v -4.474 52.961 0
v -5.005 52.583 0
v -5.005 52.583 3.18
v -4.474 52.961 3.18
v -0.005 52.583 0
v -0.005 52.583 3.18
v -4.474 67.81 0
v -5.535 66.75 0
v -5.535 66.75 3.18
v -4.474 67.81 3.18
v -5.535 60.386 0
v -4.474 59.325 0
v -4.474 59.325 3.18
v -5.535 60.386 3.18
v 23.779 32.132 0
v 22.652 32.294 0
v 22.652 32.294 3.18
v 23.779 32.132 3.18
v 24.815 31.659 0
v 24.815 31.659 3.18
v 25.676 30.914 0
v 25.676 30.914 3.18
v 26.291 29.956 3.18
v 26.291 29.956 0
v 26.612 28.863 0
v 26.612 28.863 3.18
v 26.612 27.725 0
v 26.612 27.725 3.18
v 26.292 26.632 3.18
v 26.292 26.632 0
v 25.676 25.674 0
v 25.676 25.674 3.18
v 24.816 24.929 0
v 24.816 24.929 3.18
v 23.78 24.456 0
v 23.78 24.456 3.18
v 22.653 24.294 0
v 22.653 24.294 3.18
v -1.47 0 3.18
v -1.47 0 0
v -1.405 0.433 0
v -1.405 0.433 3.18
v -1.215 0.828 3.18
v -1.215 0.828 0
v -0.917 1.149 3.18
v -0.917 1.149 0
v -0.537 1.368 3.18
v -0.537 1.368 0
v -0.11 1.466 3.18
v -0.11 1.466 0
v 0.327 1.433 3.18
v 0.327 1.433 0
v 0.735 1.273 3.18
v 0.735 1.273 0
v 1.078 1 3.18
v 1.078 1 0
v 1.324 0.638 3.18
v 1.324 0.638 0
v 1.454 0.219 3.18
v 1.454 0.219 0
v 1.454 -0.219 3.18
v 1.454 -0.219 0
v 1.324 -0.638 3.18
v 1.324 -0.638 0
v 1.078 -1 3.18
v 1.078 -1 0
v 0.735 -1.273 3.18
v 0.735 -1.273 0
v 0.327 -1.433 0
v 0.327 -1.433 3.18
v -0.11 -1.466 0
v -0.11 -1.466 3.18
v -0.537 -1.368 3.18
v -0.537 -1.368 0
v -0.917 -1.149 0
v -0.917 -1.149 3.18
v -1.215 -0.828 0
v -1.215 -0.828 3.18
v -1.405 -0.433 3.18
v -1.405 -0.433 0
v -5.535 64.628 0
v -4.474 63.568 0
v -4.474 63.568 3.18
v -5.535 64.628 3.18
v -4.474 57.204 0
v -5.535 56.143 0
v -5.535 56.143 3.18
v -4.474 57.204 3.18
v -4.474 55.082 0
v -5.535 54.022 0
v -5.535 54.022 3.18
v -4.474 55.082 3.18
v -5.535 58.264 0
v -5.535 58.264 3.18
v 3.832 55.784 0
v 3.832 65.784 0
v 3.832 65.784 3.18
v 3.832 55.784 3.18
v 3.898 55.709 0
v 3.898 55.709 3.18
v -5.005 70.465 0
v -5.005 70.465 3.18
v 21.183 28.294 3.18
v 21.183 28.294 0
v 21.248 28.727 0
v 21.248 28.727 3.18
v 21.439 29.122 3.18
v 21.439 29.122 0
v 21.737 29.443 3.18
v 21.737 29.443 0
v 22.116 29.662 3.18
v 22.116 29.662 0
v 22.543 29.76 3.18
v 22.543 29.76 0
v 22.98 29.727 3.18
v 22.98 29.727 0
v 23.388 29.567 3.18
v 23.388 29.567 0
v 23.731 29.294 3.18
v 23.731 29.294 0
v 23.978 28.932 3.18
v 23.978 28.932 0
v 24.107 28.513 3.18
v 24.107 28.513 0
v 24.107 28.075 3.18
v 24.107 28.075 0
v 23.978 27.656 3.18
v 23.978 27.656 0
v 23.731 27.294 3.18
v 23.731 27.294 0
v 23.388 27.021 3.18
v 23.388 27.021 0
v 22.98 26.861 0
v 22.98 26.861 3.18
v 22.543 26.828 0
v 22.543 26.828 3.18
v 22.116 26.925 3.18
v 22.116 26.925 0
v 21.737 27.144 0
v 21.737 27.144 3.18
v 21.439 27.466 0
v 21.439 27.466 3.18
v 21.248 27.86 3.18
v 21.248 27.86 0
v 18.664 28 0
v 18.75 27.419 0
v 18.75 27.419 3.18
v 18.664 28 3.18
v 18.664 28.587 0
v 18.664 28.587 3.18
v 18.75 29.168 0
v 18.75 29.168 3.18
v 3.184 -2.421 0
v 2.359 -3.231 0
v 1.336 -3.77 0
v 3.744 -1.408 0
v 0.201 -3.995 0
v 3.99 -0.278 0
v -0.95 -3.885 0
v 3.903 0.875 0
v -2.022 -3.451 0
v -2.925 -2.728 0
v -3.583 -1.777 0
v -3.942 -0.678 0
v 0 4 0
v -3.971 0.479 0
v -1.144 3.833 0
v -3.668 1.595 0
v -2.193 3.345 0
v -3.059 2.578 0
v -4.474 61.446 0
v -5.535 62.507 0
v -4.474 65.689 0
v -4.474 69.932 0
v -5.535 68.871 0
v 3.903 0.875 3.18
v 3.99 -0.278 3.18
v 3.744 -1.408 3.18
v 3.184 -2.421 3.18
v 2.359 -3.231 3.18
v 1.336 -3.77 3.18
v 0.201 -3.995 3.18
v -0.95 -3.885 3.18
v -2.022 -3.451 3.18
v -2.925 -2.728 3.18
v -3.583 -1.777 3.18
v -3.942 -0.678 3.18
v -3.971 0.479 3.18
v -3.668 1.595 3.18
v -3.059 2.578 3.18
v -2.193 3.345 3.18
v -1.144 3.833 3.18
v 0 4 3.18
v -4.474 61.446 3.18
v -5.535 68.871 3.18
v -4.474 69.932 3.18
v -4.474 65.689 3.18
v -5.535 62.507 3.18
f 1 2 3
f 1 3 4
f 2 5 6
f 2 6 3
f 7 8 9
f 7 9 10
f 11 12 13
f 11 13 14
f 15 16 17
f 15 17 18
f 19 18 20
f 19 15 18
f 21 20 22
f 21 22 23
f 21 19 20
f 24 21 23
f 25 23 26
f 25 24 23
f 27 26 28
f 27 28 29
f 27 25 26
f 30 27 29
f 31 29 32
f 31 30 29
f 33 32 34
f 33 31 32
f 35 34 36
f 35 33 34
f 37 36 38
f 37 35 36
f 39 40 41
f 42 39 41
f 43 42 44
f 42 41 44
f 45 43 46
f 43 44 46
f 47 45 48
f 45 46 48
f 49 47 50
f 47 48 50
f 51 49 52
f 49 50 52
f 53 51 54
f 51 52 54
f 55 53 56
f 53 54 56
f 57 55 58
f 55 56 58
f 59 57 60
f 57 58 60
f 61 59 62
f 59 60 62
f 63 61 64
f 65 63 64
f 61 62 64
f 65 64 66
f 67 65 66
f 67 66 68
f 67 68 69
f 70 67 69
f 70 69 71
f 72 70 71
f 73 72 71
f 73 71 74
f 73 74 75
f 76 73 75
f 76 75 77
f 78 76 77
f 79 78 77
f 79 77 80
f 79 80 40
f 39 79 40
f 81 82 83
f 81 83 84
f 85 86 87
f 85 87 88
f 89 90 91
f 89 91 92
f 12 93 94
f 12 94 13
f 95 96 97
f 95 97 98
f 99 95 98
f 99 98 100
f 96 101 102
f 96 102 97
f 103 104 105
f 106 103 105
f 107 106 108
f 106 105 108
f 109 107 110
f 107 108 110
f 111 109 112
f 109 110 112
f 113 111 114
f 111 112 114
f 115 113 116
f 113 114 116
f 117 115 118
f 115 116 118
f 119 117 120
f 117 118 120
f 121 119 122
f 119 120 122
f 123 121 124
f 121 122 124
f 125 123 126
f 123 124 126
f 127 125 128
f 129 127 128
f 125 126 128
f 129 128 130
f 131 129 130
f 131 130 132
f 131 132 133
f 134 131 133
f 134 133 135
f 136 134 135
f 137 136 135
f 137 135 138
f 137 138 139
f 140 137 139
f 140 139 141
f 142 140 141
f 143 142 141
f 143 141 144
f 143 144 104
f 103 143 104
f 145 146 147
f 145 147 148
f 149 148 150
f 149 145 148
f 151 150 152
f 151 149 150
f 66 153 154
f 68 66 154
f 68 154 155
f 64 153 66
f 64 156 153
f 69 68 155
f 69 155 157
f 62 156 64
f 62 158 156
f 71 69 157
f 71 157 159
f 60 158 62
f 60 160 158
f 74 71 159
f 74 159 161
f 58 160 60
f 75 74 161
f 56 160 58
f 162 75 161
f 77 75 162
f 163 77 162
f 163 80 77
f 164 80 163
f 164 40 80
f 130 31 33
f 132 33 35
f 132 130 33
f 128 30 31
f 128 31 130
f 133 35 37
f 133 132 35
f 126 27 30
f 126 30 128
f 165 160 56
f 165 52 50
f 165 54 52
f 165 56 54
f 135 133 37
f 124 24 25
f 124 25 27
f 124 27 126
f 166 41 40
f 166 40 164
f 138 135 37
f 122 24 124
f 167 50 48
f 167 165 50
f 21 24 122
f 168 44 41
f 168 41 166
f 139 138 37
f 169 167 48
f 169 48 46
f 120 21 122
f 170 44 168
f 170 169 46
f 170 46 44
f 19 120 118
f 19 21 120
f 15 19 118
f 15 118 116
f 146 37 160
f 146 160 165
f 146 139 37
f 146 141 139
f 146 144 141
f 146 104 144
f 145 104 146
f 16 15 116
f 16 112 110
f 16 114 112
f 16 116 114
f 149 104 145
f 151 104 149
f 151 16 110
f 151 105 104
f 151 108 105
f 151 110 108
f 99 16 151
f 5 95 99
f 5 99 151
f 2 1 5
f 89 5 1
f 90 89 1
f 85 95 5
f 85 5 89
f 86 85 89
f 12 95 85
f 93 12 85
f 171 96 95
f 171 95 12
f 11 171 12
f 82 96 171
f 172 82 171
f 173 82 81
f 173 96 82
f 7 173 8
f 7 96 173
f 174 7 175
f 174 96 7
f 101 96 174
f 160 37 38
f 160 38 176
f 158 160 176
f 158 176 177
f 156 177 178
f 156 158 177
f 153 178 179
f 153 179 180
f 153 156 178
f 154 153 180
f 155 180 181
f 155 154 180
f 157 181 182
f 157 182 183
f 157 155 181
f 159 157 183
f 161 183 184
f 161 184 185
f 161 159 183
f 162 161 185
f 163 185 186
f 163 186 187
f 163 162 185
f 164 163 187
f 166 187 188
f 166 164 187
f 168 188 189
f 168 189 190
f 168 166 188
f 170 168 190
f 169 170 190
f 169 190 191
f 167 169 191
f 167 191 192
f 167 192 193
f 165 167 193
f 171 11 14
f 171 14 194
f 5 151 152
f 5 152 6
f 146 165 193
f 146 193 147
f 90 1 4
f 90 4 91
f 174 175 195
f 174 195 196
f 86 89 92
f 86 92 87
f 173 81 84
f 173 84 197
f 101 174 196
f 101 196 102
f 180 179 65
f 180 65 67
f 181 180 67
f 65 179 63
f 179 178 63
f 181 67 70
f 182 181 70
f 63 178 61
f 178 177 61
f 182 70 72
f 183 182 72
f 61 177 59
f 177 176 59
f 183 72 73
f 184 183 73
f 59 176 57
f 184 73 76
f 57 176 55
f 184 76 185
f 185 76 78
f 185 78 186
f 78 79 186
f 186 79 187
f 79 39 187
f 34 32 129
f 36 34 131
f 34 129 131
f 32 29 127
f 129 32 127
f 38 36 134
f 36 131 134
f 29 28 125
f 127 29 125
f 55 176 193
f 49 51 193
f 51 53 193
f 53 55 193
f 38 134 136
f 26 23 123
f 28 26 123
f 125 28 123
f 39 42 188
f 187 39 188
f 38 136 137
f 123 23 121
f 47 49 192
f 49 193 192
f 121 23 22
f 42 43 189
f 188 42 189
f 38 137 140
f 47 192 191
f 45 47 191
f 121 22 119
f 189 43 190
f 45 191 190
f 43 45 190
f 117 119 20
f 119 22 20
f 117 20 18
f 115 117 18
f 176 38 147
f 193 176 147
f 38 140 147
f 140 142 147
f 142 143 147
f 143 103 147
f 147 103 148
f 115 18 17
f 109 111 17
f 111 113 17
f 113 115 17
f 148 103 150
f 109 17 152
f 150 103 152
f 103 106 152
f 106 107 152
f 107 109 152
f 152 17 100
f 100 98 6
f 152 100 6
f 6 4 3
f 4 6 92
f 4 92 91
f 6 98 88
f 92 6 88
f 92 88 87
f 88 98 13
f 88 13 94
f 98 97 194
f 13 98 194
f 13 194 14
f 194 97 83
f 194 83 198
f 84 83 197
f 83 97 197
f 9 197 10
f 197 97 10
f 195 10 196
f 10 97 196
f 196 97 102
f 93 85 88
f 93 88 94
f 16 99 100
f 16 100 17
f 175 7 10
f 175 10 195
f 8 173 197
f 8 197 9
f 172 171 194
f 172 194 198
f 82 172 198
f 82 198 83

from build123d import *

# Parameters (mm, degrees)
BOSS_EXTRUDE1_DEPTH = 3.18
SKETCH2_R           = 1.47
CUT_EXTRUDE1_DEPTH  = 76.404806599
SKETCH3_R           = 1.47
CUT_EXTRUDE2_DEPTH  = 76.404806599


with BuildPart() as part:
    # Sketch1 → Boss-Extrude1 (new body)
    with BuildSketch(Plane.XY):
        with BuildLine():
            Line((0, 4), (18.75, 27.418742494))
            ThreePointArc((18.75, 27.418742494), (18.653123767, 28.293364452), (18.749834676, 29.168004707))
            Line((18.749834676, 29.168004707), (-0.00459162, 52.583202641))
            Line((-0.00459162, 52.583202641), (-5.00459162, 52.583202641))
            Line((-5.00459162, 52.583202641), (-4.474261534, 52.960989463))
            Line((-4.474261534, 52.960989463), (-5.534921706, 54.021649635))
            Line((-5.534921706, 54.021649635), (-4.474261534, 55.082309806))
            Line((-4.474261534, 55.082309806), (-5.534921706, 56.142969978))
            Line((-5.534921706, 56.142969978), (-4.474261534, 57.20363015))
            Line((-4.474261534, 57.20363015), (-5.534921706, 58.264290322))
            Line((-5.534921706, 58.264290322), (-4.474261534, 59.324950494))
            Line((-4.474261534, 59.324950494), (-5.534921706, 60.385610665))
            Line((-5.534921706, 60.385610665), (-4.474261534, 61.446270837))
            Line((-4.474261534, 61.446270837), (-5.534921706, 62.506931009))
            Line((-5.534921706, 62.506931009), (-4.474261534, 63.567591181))
            Line((-4.474261534, 63.567591181), (-5.534921705, 64.628251353))
            Line((-5.534921705, 64.628251353), (-4.474261534, 65.688911524))
            Line((-4.474261534, 65.688911524), (-5.534921705, 66.749571696))
            Line((-5.534921705, 66.749571696), (-4.474261534, 67.810231868))
            Line((-4.474261534, 67.810231868), (-5.534921705, 68.87089204))
            Line((-5.534921705, 68.87089204), (-4.474261534, 69.931552211))
            Line((-4.474261534, 69.931552211), (-5.00459162, 70.465477027))
            Line((-5.00459162, 70.465477027), (3.831950272, 65.784074737))
            Line((3.831950272, 65.784074737), (3.831950272, 55.784074737))
            Line((3.831950272, 55.784074737), (3.897941369, 55.708940357))
            Line((3.897941369, 55.708940357), (22.652367666, 32.293742423))
            ThreePointArc((22.652367666, 32.293742423), (26.653123731, 28.294120536), (22.653123749, 24.293742494))
            Line((22.653123749, 24.293742494), (3.903123749, 0.875))
            ThreePointArc((3.903123749, 0.875), (-2.5, -3.122498999), (0, 4))
        make_face()
    extrude(amount=BOSS_EXTRUDE1_DEPTH)

    # Sketch2 → Cut-Extrude1 (cut, through all)
    with BuildSketch(Plane(origin=(0, 0, 0), x_dir=(-1, 0, 0), z_dir=(0, 0, -1))):
        with Locations((-22.653123749, 28.293742494)):
            Circle(SKETCH2_R)
    extrude(amount=-CUT_EXTRUDE1_DEPTH, mode=Mode.SUBTRACT)

    # Sketch3 → Cut-Extrude2 (cut, through all)
    with BuildSketch(Plane(origin=(0, 0, 0), x_dir=(-1, 0, 0), z_dir=(0, 0, -1))):
        Circle(SKETCH3_R)
    extrude(amount=-CUT_EXTRUDE2_DEPTH, mode=Mode.SUBTRACT)


solid = part.part
